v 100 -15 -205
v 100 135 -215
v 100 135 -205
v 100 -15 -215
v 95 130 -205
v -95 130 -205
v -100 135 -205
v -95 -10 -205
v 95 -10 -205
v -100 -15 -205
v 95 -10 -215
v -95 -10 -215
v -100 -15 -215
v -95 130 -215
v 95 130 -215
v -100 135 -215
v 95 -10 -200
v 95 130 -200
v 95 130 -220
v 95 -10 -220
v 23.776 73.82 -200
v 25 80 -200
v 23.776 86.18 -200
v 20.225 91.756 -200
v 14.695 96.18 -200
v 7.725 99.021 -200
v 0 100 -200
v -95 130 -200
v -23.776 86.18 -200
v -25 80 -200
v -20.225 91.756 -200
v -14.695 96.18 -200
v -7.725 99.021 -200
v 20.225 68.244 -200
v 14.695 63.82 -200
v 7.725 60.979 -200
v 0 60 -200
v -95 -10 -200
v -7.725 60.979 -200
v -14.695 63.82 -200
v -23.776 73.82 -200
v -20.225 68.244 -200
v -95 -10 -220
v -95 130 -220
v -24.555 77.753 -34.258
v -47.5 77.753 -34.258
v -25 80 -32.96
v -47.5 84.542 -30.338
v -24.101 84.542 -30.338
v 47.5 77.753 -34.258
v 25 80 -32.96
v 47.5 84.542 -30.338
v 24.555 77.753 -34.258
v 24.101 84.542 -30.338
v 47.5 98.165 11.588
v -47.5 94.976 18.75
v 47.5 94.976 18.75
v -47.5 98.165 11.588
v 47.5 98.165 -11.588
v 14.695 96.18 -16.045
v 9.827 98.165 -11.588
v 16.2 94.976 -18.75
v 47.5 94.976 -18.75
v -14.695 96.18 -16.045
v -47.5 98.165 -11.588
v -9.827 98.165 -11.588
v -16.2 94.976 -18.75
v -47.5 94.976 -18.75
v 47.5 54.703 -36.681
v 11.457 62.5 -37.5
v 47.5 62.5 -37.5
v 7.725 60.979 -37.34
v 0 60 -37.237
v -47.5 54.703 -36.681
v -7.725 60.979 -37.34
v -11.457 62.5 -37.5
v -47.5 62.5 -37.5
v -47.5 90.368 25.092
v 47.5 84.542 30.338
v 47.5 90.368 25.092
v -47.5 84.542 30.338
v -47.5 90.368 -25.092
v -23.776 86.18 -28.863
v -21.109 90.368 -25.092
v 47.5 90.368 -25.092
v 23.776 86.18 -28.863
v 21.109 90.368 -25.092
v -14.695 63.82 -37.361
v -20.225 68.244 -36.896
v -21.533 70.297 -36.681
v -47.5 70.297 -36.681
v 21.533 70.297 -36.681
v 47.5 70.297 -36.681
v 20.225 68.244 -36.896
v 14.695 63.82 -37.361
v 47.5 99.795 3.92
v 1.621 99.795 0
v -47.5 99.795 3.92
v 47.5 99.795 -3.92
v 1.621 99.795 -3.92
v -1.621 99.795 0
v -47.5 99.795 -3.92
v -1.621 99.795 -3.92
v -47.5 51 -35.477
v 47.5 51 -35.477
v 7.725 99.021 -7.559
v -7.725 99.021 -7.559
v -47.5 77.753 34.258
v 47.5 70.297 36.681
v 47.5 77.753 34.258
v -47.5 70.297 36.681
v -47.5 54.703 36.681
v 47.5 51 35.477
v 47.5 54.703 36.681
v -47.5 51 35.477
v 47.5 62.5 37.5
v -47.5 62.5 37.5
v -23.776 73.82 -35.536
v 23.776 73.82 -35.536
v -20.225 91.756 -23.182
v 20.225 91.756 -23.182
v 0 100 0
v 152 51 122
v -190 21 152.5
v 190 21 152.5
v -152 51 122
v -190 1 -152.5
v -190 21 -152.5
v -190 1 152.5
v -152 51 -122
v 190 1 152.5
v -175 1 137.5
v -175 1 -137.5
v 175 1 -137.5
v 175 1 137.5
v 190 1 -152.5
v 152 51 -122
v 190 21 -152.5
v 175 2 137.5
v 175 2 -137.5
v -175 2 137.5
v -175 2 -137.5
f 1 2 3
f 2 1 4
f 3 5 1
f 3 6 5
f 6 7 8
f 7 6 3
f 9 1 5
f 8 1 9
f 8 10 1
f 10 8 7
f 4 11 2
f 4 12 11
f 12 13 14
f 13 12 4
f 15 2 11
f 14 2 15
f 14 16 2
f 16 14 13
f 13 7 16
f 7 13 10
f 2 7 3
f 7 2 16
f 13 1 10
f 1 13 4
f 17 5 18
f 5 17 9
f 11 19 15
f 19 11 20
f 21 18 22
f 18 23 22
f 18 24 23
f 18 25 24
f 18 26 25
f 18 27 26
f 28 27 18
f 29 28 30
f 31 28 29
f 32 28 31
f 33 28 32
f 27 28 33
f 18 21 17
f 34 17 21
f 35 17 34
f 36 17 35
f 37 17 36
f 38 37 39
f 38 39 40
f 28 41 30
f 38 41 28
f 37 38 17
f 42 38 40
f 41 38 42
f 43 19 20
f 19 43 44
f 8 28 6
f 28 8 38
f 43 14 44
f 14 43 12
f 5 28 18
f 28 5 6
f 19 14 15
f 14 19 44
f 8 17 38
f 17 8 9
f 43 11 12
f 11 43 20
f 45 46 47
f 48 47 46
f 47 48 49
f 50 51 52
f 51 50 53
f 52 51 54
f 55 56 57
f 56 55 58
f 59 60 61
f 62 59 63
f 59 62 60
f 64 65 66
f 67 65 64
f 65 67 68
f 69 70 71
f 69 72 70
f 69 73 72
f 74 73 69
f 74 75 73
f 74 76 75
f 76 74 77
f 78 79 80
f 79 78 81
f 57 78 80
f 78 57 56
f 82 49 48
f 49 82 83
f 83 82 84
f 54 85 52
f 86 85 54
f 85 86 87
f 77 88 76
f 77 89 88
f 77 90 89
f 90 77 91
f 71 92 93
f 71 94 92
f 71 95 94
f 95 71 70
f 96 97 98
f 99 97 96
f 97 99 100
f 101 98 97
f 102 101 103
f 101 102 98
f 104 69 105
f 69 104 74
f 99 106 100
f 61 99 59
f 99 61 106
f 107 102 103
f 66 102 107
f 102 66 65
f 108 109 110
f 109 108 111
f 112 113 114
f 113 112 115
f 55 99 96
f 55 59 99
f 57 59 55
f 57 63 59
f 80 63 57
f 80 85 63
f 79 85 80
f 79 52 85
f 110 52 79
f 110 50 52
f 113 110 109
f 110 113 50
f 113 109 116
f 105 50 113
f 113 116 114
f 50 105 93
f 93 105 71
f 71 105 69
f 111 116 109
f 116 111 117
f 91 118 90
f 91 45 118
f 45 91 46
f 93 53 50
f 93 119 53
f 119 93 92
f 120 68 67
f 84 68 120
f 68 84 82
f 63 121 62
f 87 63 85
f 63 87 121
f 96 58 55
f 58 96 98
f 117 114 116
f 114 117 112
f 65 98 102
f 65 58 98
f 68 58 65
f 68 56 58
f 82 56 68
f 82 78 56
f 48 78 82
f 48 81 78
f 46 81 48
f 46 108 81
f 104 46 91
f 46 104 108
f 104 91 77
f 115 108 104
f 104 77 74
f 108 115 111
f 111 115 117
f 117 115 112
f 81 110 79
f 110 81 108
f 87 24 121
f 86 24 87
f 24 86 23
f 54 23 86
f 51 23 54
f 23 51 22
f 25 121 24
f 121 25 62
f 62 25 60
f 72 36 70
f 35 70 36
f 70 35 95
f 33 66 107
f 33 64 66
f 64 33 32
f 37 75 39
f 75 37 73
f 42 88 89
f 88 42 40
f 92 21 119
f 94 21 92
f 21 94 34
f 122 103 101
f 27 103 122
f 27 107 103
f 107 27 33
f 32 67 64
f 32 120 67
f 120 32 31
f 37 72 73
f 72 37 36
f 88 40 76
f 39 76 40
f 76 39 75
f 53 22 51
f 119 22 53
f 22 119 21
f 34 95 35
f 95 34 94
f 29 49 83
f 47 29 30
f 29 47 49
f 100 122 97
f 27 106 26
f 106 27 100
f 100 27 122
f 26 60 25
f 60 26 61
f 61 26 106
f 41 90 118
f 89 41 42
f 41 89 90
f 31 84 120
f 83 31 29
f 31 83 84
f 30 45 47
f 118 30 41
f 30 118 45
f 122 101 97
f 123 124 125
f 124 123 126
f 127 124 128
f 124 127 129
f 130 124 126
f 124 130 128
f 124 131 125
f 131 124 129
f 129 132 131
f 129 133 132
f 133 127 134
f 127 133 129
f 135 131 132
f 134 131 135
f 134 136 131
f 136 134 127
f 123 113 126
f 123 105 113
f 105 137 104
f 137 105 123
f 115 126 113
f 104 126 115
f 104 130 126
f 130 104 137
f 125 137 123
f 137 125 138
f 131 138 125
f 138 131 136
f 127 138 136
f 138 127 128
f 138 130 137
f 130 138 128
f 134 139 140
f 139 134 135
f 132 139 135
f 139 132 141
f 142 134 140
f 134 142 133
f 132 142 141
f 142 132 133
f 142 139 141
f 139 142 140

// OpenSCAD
/**
 *
 * @licstart
 *
 * Copyright (C) 2017  AlephObjects, Inc.
 *
 *
 * The JavaScript code in this page is free software: you can
 * redistribute it and/or modify it under the terms of the GNU
 * General Public License (GNU GPL) as published by the Free Software
 * Foundation, either version 3 of the License, or (at your option)
 * any later version.  The code is distributed WITHOUT ANY WARRANTY;
 * without even the implied warranty of MERCHANTABILITY or FITNESS
 * FOR A PARTICULAR PURPOSE.  See the GNU GPL for more details.
 *
 * As additional permission under GNU GPL version 3 section 7, you
 * may distribute non-source (e.g., minimized or compacted) forms of
 * that code without the copy of the GNU GPL normally required by
 * section 4, provided you include this license notice and a URL
 * through which recipients can access the Corresponding Source.
 *
 * @licend
 *
 */

display_width  = 380;
display_height = 305;
display_depth  = 20;
display_bezel  = 30;

mount_dia      = 75;

stand_height   = 200;
stand_width    = 50;
stand_depth    = 40;

base_thickness = 20;
base_depth     = 150;
base_width     = 200;
base_chamfer   = 10;

module display() {
    display_recess = 2;
    translate([0,display_recess/2+display_depth/2,0])
    difference() {
        hull() {
            cube([display_width,display_depth,display_height],center=true);
            translate([0,display_depth,0])
                cube([display_width*0.8,display_depth*2,display_height*0.8],center=true);
        }
        translate([0,-display_depth/2,0])
            cube([display_width-display_bezel,display_recess,display_height-display_bezel],center=true);
    }
}

module stand() {
    difference() {
        translate([0,display_depth+stand_depth*1.5,0]) {

            // Hinge mount
            translate([0,-mount_dia/2+stand_depth/2,0])
            rotate([0,90,0])
                cylinder(r=mount_dia/2,h=display_width/4,center=true);

            // Vertical support
            translate([0,0,-stand_height/2])
                scale([stand_width, stand_depth, stand_height])
                    cylinder(h=1, r=0.5, center=true, $fn=20);
        }
        translate([0,-500,0])
            cube([1000,1000,1000],center=true);
    }
}

module base() {
	translate([0,base_depth*0.4,-stand_height-base_thickness/2]) {
        cube([base_width, base_depth, base_thickness-base_chamfer], center=true);
        cube([base_width-base_chamfer, base_depth-base_chamfer, base_thickness], center=true);
    }
}

base();
stand();
display();
